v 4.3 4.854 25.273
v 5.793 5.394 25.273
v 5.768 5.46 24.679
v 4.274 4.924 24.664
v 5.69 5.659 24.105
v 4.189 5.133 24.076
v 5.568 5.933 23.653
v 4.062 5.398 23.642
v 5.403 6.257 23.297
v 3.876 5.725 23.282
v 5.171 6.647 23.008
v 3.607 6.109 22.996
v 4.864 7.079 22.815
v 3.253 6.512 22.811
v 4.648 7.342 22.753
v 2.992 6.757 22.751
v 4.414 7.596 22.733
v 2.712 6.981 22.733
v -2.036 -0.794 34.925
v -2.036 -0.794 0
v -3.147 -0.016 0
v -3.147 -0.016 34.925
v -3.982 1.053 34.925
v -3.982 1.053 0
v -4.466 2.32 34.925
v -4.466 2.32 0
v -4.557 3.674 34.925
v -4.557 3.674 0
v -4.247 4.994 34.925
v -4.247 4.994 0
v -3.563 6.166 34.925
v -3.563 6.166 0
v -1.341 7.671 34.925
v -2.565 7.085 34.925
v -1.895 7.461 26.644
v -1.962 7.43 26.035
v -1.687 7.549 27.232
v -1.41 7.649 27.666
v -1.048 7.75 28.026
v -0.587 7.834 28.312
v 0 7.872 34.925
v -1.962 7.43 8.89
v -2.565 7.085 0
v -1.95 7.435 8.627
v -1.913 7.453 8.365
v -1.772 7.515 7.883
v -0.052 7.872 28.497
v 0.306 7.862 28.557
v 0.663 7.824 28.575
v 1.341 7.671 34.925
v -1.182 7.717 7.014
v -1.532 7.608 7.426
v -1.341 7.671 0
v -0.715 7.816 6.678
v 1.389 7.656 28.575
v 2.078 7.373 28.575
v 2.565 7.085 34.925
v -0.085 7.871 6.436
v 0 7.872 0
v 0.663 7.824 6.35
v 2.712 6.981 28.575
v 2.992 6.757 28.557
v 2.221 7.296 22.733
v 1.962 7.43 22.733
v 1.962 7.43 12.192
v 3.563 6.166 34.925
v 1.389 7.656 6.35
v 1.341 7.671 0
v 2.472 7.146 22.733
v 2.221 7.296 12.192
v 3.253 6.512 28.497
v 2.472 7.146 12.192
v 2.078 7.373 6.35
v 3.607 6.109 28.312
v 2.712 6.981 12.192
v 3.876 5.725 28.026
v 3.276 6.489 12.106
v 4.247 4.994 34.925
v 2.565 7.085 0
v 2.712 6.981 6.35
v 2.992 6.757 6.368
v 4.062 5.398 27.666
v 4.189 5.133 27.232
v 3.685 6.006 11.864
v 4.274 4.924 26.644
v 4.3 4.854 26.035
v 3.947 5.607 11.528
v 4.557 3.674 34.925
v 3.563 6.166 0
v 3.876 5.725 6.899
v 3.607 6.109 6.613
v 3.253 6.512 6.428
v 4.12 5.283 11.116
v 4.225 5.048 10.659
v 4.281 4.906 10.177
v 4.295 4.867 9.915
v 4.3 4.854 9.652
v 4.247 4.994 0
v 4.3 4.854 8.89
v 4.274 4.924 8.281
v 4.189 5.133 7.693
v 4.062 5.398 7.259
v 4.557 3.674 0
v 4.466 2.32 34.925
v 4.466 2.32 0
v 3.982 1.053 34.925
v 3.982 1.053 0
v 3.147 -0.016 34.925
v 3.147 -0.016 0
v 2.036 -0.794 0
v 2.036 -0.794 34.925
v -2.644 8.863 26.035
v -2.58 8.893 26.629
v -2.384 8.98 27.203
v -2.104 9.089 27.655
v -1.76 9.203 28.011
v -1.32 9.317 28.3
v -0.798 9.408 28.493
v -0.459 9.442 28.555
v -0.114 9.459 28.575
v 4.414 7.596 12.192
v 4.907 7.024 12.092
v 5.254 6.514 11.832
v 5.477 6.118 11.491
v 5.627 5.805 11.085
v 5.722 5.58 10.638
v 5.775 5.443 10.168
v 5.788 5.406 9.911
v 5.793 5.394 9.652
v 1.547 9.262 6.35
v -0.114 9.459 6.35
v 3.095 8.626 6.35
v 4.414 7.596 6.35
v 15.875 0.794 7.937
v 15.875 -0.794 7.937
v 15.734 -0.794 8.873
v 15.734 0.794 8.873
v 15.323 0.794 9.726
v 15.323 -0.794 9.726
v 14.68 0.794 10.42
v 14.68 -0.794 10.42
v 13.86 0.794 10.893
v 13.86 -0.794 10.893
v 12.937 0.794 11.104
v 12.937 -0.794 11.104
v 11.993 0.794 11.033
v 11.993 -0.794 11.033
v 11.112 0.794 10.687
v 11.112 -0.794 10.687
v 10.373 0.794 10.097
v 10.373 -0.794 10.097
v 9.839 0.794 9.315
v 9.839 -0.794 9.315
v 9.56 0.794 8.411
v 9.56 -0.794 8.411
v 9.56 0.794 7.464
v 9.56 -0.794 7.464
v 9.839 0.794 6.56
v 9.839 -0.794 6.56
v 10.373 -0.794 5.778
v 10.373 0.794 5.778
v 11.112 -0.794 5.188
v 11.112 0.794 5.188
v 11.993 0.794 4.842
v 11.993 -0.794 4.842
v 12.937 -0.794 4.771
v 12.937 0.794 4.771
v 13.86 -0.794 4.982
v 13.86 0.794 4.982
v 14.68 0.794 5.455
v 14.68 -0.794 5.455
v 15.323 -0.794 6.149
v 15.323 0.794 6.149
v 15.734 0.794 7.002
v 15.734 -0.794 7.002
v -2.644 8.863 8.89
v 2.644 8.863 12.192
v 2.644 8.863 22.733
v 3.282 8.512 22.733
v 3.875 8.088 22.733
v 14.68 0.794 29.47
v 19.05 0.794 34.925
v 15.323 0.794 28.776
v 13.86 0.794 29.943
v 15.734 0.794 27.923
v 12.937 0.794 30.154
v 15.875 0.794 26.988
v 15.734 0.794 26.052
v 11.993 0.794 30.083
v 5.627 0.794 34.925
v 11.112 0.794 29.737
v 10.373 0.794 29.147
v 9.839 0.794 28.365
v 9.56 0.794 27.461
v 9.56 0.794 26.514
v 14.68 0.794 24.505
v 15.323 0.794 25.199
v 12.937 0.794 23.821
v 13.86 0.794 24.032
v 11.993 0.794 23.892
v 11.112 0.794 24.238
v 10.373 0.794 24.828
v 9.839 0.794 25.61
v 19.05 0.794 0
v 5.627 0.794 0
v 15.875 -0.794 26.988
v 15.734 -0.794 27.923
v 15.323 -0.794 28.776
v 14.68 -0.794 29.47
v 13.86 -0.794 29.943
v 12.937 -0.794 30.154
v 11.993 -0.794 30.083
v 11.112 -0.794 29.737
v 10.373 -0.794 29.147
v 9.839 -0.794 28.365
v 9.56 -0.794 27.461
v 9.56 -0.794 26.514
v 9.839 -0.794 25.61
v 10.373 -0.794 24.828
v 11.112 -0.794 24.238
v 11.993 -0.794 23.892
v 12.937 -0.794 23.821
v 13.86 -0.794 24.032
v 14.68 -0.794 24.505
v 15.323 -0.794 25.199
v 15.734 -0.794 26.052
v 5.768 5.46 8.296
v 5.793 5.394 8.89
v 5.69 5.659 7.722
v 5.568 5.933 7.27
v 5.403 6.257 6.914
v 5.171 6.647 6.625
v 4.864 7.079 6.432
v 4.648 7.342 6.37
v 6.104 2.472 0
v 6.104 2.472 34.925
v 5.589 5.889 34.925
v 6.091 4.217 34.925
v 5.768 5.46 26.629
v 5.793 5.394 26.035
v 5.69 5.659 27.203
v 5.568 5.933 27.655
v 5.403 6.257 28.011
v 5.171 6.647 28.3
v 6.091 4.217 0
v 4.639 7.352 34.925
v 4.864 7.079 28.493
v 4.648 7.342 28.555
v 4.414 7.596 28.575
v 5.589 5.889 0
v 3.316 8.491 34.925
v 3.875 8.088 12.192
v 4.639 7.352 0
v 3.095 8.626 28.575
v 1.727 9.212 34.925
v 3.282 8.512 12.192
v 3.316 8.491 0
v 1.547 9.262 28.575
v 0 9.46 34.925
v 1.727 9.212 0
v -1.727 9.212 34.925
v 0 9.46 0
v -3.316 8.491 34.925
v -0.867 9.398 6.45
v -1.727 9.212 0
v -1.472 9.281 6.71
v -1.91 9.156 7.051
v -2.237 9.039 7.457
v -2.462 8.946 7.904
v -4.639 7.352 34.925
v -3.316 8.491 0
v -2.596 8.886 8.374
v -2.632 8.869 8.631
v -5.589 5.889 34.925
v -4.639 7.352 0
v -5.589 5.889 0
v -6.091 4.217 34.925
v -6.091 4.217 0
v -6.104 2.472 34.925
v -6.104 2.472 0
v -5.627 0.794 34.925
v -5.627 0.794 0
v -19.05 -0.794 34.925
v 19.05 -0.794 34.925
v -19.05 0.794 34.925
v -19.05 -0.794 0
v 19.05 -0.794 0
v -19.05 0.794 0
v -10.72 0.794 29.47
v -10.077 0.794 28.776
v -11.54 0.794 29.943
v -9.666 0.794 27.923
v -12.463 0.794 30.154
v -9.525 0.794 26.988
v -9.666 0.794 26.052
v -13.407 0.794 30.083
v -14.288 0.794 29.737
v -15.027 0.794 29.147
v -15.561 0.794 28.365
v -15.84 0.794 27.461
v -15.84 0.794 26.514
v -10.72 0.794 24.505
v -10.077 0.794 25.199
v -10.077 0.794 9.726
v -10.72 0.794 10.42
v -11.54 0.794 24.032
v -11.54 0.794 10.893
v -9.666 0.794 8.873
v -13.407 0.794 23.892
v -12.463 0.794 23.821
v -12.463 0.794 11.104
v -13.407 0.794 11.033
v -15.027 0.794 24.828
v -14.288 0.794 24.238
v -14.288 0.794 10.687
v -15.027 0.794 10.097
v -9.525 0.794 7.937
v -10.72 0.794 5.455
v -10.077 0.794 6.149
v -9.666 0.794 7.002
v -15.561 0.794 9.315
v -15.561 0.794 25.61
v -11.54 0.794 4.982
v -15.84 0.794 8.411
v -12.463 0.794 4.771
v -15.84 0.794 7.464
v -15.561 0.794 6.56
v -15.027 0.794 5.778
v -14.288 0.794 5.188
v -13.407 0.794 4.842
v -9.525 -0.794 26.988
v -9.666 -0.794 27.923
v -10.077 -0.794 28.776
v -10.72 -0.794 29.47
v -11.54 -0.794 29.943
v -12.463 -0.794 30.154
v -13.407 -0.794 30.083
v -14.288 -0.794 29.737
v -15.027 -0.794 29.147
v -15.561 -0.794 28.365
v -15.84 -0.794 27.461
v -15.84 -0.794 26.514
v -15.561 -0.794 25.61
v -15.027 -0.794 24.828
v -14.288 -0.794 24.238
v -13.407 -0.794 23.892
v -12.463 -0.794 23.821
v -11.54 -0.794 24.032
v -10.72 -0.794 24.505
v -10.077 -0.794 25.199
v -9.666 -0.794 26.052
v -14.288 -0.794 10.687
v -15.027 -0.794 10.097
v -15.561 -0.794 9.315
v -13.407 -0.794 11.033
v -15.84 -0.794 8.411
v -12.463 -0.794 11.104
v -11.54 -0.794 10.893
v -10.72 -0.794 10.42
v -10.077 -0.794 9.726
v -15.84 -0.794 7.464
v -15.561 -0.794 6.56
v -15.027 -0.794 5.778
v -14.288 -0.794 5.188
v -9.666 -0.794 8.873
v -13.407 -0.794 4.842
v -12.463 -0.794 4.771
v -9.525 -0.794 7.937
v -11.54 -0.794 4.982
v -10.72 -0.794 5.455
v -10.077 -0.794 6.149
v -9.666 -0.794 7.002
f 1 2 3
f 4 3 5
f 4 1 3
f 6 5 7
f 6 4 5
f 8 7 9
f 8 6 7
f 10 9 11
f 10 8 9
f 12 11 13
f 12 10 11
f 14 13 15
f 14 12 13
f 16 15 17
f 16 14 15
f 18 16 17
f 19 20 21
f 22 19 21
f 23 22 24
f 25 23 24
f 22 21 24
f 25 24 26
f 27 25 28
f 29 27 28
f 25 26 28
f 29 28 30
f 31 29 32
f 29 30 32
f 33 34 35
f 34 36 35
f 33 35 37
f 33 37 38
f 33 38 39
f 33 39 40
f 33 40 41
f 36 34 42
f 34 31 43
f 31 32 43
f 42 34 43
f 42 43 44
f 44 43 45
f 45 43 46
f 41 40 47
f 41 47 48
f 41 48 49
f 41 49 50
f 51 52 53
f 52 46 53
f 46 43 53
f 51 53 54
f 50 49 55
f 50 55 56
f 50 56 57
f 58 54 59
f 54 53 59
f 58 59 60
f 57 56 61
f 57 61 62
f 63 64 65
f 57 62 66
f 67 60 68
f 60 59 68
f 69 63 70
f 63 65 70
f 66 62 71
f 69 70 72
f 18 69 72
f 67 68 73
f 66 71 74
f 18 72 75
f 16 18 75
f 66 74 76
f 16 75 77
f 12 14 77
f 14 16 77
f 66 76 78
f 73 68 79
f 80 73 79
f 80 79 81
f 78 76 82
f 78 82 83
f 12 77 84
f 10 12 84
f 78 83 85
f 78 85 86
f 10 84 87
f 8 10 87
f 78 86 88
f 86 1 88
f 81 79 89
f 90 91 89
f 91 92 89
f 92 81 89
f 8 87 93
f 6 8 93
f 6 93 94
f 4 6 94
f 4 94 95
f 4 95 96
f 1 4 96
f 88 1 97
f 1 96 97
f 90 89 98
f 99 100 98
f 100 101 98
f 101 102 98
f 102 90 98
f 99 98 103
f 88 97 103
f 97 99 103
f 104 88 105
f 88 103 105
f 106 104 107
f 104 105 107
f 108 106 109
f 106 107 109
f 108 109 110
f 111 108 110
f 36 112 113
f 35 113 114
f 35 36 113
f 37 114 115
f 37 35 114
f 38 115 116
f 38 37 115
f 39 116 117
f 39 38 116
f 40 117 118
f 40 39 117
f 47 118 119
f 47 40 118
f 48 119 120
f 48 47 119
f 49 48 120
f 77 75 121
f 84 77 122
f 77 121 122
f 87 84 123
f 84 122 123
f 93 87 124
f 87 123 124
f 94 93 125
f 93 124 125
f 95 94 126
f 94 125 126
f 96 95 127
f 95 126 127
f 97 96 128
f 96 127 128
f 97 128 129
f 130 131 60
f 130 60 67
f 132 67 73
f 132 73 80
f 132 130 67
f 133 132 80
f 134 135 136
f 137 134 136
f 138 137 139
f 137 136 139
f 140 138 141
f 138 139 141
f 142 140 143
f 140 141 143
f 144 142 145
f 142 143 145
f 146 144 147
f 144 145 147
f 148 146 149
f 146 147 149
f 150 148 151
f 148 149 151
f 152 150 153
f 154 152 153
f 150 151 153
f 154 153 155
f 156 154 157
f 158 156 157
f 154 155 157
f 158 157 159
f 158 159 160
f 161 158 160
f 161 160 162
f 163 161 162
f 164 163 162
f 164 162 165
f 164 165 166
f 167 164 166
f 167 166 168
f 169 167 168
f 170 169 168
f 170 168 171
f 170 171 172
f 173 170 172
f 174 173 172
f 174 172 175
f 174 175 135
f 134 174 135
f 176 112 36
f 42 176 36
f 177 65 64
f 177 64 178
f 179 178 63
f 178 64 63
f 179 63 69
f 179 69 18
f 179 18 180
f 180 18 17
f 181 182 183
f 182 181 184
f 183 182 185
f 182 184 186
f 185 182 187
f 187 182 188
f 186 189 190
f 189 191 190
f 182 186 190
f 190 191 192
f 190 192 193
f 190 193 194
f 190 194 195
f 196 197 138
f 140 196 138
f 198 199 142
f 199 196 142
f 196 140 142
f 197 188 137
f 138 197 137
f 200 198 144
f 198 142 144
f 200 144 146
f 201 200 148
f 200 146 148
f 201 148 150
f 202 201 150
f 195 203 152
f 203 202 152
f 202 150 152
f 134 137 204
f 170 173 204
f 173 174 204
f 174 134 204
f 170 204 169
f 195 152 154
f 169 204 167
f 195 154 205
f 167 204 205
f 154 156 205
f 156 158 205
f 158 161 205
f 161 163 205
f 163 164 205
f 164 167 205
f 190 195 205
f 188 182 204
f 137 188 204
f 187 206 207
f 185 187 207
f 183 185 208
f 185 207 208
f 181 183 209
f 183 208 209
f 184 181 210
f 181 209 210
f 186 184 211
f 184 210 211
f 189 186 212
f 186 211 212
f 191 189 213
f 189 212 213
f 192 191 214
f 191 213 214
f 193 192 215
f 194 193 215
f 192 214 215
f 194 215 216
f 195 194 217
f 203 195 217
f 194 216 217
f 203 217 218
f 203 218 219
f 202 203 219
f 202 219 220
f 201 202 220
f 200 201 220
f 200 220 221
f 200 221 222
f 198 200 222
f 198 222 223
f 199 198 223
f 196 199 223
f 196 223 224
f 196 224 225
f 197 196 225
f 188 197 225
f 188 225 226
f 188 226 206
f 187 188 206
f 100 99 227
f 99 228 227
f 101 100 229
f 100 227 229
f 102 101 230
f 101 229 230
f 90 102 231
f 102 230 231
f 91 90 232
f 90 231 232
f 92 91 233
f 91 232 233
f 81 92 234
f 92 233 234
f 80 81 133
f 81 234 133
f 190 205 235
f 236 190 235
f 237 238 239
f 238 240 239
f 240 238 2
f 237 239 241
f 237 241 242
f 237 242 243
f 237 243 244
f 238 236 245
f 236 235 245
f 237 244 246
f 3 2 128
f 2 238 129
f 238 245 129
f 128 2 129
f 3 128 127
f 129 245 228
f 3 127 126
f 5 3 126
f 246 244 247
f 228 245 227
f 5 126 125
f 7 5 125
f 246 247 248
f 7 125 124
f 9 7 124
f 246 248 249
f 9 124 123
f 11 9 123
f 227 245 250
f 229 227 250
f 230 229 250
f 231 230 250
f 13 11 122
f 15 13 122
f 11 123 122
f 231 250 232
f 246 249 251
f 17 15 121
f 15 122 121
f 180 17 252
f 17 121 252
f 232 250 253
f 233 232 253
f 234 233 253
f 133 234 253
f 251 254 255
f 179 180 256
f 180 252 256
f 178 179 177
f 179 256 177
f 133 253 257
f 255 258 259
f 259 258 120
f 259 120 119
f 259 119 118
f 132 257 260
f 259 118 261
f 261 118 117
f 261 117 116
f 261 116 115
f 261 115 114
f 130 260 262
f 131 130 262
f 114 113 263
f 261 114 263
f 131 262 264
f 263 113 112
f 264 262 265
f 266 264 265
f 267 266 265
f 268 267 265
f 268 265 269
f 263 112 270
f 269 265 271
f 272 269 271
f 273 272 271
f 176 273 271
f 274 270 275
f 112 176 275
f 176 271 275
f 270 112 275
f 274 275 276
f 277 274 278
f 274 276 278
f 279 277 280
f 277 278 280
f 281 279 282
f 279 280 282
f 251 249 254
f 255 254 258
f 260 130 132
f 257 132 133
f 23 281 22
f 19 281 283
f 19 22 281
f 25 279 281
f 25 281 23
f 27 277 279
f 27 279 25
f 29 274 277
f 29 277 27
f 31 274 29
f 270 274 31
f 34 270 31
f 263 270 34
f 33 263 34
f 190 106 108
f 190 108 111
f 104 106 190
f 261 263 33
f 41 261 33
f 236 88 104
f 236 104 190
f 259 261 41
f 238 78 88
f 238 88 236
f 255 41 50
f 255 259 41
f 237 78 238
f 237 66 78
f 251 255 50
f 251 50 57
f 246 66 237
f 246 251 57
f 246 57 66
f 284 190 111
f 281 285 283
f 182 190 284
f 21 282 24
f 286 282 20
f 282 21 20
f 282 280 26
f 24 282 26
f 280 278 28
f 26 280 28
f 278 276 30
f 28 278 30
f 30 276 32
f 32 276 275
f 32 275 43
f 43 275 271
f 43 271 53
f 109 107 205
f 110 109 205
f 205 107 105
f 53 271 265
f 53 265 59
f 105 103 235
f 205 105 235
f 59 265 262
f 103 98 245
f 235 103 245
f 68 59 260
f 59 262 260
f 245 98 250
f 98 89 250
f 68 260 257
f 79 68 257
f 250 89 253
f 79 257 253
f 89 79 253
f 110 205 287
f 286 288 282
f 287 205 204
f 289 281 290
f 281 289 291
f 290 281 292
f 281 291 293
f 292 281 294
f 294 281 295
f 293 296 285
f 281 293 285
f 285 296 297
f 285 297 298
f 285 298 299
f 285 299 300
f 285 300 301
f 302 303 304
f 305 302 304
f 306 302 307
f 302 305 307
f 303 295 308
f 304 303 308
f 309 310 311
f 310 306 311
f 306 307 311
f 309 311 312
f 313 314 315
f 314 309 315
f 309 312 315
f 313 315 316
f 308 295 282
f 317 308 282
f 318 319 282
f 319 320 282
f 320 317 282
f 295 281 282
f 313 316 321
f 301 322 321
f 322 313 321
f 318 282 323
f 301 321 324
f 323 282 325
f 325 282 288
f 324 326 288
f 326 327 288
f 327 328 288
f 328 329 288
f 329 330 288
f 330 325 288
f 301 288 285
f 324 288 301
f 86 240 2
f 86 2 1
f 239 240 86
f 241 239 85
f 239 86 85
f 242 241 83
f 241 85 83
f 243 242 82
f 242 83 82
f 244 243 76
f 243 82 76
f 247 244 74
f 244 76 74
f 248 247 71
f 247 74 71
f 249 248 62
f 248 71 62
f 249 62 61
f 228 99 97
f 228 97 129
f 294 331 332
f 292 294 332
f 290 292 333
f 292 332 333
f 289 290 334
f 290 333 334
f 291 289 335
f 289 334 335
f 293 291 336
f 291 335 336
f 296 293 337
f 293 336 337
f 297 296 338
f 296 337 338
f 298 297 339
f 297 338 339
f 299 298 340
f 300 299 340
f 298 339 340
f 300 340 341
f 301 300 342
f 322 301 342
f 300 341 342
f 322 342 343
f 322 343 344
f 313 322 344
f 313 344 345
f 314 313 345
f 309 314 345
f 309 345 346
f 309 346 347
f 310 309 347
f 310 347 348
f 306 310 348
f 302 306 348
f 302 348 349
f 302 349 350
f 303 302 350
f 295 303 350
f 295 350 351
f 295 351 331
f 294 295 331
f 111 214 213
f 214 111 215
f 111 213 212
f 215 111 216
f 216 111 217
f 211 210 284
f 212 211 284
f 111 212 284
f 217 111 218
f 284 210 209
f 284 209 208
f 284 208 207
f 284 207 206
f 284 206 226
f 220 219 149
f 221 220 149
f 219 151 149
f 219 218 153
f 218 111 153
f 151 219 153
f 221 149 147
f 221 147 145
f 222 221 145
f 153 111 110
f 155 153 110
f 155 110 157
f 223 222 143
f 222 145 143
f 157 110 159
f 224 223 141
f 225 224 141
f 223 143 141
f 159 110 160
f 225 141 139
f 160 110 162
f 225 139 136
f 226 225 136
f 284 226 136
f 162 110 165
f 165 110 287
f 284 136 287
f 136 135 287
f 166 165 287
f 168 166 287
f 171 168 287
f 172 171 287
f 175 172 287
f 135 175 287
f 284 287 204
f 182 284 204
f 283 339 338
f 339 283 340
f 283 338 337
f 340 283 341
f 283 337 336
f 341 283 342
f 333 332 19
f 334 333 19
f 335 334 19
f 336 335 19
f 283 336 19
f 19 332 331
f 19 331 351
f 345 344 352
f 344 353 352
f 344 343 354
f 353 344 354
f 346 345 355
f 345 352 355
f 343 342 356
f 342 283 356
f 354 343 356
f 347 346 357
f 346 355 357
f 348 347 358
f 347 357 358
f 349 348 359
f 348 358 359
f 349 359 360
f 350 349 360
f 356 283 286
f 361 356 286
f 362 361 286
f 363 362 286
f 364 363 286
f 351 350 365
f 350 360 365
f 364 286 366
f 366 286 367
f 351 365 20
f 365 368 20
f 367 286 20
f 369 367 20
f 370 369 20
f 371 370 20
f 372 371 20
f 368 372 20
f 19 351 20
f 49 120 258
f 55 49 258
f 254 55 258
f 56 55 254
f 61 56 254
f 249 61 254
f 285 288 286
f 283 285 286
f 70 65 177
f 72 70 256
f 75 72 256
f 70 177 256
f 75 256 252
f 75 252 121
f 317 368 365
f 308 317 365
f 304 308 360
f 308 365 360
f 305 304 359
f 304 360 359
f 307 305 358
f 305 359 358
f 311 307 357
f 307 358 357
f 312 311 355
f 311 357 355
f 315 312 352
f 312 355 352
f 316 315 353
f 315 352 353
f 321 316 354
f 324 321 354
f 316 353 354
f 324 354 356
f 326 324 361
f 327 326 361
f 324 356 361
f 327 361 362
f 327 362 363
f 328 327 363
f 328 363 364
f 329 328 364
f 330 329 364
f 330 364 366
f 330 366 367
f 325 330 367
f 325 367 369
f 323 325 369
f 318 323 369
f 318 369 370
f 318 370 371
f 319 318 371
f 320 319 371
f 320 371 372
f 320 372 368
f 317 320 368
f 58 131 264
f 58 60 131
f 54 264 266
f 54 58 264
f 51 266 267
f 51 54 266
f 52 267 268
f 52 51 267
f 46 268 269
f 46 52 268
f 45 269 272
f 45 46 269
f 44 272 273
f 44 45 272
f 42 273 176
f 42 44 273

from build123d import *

# Parameters (mm, degrees)
F1_DEPTH  = 34.925
F3_D      = 6.35
F6_DEPTH  = 22.225
F8_DEPTH  = 5.842
F10_DEPTH = 5.842
F11_R     = 2.54


with BuildPart() as f1:
    # F0 (on Top) → F1 (new body)
    with BuildSketch(Plane.XY):
        with BuildLine():
            Line((-5.6265138051, 0.79375), (-19.05, 0.79375))
            Line((-19.05, 0.79375), (-19.05, -0.79375))
            Line((-19.05, -0.79375), (-2.035580681, -0.79375))
            ThreePointArc((-2.035580681, -0.79375), (0, 7.8720984695), (2.035580681, -0.79375))
            Line((2.035580681, -0.79375), (19.05, -0.79375))
            Line((19.05, -0.79375), (19.05, 0.79375))
            Line((19.05, 0.79375), (5.6265138051, 0.79375))
            ThreePointArc((5.6265138051, 0.79375), (0, 9.4595984695), (-5.6265138051, 0.79375))
        make_face()
    extrude(amount=F1_DEPTH)

    # F3 (through all)
    with Locations(Plane(origin=(0, 0.79375, 0), x_dir=(-1, 0, 0), z_dir=(0, 1, 0))):
        with Locations((12.7, 7.9375), (12.7, 26.9875), (-12.7, 26.9875), (-12.7, 7.9375)):
            Hole(F3_D / 2)

    # F5 (on offset) → F6 (cut)
    with BuildSketch(Plane.XY.offset(6.35)):
        Polygon((-4.318, 12.3874302953), (0, 3.3000984695), (4.318, 12.3874302953), align=None)
    extrude(amount=F6_DEPTH, mode=Mode.SUBTRACT)

    # F7 (on offset) → F8 (cut)
    with BuildSketch(Plane.XY.offset(6.35)):
        Polygon((0, 15.2833266184), (0, 3.3000984695), (13.4768653661, 8.1709222868), align=None)
    extrude(amount=F8_DEPTH, mode=Mode.SUBTRACT)

    # F9 (on face) → F10 (cut)
    with BuildSketch(Plane(origin=(0, 0, 28.575), x_dir=(1, 0, 0), z_dir=(0, 0, -1))):
        Polygon((8.5841133563, -6.4025783601), (0, -3.3000984695), (0, -13.6242890731), align=None)
    extrude(amount=F10_DEPTH, mode=Mode.SUBTRACT)

    # F11
    f11_edges = [f1.edges().sort_by_distance(p)[0] for p in [
        (-2.302872, 8.146546, 28.575),
        (-2.302872, 8.146546, 6.35),
        (5.046277, 5.12393, 6.35),
        (5.046277, 5.12393, 12.192),
        (5.046277, 5.12393, 22.733),
        (5.046277, 5.12393, 28.575),
    ]]
    fillet(f11_edges, radius=F11_R)


solid = f1.part
